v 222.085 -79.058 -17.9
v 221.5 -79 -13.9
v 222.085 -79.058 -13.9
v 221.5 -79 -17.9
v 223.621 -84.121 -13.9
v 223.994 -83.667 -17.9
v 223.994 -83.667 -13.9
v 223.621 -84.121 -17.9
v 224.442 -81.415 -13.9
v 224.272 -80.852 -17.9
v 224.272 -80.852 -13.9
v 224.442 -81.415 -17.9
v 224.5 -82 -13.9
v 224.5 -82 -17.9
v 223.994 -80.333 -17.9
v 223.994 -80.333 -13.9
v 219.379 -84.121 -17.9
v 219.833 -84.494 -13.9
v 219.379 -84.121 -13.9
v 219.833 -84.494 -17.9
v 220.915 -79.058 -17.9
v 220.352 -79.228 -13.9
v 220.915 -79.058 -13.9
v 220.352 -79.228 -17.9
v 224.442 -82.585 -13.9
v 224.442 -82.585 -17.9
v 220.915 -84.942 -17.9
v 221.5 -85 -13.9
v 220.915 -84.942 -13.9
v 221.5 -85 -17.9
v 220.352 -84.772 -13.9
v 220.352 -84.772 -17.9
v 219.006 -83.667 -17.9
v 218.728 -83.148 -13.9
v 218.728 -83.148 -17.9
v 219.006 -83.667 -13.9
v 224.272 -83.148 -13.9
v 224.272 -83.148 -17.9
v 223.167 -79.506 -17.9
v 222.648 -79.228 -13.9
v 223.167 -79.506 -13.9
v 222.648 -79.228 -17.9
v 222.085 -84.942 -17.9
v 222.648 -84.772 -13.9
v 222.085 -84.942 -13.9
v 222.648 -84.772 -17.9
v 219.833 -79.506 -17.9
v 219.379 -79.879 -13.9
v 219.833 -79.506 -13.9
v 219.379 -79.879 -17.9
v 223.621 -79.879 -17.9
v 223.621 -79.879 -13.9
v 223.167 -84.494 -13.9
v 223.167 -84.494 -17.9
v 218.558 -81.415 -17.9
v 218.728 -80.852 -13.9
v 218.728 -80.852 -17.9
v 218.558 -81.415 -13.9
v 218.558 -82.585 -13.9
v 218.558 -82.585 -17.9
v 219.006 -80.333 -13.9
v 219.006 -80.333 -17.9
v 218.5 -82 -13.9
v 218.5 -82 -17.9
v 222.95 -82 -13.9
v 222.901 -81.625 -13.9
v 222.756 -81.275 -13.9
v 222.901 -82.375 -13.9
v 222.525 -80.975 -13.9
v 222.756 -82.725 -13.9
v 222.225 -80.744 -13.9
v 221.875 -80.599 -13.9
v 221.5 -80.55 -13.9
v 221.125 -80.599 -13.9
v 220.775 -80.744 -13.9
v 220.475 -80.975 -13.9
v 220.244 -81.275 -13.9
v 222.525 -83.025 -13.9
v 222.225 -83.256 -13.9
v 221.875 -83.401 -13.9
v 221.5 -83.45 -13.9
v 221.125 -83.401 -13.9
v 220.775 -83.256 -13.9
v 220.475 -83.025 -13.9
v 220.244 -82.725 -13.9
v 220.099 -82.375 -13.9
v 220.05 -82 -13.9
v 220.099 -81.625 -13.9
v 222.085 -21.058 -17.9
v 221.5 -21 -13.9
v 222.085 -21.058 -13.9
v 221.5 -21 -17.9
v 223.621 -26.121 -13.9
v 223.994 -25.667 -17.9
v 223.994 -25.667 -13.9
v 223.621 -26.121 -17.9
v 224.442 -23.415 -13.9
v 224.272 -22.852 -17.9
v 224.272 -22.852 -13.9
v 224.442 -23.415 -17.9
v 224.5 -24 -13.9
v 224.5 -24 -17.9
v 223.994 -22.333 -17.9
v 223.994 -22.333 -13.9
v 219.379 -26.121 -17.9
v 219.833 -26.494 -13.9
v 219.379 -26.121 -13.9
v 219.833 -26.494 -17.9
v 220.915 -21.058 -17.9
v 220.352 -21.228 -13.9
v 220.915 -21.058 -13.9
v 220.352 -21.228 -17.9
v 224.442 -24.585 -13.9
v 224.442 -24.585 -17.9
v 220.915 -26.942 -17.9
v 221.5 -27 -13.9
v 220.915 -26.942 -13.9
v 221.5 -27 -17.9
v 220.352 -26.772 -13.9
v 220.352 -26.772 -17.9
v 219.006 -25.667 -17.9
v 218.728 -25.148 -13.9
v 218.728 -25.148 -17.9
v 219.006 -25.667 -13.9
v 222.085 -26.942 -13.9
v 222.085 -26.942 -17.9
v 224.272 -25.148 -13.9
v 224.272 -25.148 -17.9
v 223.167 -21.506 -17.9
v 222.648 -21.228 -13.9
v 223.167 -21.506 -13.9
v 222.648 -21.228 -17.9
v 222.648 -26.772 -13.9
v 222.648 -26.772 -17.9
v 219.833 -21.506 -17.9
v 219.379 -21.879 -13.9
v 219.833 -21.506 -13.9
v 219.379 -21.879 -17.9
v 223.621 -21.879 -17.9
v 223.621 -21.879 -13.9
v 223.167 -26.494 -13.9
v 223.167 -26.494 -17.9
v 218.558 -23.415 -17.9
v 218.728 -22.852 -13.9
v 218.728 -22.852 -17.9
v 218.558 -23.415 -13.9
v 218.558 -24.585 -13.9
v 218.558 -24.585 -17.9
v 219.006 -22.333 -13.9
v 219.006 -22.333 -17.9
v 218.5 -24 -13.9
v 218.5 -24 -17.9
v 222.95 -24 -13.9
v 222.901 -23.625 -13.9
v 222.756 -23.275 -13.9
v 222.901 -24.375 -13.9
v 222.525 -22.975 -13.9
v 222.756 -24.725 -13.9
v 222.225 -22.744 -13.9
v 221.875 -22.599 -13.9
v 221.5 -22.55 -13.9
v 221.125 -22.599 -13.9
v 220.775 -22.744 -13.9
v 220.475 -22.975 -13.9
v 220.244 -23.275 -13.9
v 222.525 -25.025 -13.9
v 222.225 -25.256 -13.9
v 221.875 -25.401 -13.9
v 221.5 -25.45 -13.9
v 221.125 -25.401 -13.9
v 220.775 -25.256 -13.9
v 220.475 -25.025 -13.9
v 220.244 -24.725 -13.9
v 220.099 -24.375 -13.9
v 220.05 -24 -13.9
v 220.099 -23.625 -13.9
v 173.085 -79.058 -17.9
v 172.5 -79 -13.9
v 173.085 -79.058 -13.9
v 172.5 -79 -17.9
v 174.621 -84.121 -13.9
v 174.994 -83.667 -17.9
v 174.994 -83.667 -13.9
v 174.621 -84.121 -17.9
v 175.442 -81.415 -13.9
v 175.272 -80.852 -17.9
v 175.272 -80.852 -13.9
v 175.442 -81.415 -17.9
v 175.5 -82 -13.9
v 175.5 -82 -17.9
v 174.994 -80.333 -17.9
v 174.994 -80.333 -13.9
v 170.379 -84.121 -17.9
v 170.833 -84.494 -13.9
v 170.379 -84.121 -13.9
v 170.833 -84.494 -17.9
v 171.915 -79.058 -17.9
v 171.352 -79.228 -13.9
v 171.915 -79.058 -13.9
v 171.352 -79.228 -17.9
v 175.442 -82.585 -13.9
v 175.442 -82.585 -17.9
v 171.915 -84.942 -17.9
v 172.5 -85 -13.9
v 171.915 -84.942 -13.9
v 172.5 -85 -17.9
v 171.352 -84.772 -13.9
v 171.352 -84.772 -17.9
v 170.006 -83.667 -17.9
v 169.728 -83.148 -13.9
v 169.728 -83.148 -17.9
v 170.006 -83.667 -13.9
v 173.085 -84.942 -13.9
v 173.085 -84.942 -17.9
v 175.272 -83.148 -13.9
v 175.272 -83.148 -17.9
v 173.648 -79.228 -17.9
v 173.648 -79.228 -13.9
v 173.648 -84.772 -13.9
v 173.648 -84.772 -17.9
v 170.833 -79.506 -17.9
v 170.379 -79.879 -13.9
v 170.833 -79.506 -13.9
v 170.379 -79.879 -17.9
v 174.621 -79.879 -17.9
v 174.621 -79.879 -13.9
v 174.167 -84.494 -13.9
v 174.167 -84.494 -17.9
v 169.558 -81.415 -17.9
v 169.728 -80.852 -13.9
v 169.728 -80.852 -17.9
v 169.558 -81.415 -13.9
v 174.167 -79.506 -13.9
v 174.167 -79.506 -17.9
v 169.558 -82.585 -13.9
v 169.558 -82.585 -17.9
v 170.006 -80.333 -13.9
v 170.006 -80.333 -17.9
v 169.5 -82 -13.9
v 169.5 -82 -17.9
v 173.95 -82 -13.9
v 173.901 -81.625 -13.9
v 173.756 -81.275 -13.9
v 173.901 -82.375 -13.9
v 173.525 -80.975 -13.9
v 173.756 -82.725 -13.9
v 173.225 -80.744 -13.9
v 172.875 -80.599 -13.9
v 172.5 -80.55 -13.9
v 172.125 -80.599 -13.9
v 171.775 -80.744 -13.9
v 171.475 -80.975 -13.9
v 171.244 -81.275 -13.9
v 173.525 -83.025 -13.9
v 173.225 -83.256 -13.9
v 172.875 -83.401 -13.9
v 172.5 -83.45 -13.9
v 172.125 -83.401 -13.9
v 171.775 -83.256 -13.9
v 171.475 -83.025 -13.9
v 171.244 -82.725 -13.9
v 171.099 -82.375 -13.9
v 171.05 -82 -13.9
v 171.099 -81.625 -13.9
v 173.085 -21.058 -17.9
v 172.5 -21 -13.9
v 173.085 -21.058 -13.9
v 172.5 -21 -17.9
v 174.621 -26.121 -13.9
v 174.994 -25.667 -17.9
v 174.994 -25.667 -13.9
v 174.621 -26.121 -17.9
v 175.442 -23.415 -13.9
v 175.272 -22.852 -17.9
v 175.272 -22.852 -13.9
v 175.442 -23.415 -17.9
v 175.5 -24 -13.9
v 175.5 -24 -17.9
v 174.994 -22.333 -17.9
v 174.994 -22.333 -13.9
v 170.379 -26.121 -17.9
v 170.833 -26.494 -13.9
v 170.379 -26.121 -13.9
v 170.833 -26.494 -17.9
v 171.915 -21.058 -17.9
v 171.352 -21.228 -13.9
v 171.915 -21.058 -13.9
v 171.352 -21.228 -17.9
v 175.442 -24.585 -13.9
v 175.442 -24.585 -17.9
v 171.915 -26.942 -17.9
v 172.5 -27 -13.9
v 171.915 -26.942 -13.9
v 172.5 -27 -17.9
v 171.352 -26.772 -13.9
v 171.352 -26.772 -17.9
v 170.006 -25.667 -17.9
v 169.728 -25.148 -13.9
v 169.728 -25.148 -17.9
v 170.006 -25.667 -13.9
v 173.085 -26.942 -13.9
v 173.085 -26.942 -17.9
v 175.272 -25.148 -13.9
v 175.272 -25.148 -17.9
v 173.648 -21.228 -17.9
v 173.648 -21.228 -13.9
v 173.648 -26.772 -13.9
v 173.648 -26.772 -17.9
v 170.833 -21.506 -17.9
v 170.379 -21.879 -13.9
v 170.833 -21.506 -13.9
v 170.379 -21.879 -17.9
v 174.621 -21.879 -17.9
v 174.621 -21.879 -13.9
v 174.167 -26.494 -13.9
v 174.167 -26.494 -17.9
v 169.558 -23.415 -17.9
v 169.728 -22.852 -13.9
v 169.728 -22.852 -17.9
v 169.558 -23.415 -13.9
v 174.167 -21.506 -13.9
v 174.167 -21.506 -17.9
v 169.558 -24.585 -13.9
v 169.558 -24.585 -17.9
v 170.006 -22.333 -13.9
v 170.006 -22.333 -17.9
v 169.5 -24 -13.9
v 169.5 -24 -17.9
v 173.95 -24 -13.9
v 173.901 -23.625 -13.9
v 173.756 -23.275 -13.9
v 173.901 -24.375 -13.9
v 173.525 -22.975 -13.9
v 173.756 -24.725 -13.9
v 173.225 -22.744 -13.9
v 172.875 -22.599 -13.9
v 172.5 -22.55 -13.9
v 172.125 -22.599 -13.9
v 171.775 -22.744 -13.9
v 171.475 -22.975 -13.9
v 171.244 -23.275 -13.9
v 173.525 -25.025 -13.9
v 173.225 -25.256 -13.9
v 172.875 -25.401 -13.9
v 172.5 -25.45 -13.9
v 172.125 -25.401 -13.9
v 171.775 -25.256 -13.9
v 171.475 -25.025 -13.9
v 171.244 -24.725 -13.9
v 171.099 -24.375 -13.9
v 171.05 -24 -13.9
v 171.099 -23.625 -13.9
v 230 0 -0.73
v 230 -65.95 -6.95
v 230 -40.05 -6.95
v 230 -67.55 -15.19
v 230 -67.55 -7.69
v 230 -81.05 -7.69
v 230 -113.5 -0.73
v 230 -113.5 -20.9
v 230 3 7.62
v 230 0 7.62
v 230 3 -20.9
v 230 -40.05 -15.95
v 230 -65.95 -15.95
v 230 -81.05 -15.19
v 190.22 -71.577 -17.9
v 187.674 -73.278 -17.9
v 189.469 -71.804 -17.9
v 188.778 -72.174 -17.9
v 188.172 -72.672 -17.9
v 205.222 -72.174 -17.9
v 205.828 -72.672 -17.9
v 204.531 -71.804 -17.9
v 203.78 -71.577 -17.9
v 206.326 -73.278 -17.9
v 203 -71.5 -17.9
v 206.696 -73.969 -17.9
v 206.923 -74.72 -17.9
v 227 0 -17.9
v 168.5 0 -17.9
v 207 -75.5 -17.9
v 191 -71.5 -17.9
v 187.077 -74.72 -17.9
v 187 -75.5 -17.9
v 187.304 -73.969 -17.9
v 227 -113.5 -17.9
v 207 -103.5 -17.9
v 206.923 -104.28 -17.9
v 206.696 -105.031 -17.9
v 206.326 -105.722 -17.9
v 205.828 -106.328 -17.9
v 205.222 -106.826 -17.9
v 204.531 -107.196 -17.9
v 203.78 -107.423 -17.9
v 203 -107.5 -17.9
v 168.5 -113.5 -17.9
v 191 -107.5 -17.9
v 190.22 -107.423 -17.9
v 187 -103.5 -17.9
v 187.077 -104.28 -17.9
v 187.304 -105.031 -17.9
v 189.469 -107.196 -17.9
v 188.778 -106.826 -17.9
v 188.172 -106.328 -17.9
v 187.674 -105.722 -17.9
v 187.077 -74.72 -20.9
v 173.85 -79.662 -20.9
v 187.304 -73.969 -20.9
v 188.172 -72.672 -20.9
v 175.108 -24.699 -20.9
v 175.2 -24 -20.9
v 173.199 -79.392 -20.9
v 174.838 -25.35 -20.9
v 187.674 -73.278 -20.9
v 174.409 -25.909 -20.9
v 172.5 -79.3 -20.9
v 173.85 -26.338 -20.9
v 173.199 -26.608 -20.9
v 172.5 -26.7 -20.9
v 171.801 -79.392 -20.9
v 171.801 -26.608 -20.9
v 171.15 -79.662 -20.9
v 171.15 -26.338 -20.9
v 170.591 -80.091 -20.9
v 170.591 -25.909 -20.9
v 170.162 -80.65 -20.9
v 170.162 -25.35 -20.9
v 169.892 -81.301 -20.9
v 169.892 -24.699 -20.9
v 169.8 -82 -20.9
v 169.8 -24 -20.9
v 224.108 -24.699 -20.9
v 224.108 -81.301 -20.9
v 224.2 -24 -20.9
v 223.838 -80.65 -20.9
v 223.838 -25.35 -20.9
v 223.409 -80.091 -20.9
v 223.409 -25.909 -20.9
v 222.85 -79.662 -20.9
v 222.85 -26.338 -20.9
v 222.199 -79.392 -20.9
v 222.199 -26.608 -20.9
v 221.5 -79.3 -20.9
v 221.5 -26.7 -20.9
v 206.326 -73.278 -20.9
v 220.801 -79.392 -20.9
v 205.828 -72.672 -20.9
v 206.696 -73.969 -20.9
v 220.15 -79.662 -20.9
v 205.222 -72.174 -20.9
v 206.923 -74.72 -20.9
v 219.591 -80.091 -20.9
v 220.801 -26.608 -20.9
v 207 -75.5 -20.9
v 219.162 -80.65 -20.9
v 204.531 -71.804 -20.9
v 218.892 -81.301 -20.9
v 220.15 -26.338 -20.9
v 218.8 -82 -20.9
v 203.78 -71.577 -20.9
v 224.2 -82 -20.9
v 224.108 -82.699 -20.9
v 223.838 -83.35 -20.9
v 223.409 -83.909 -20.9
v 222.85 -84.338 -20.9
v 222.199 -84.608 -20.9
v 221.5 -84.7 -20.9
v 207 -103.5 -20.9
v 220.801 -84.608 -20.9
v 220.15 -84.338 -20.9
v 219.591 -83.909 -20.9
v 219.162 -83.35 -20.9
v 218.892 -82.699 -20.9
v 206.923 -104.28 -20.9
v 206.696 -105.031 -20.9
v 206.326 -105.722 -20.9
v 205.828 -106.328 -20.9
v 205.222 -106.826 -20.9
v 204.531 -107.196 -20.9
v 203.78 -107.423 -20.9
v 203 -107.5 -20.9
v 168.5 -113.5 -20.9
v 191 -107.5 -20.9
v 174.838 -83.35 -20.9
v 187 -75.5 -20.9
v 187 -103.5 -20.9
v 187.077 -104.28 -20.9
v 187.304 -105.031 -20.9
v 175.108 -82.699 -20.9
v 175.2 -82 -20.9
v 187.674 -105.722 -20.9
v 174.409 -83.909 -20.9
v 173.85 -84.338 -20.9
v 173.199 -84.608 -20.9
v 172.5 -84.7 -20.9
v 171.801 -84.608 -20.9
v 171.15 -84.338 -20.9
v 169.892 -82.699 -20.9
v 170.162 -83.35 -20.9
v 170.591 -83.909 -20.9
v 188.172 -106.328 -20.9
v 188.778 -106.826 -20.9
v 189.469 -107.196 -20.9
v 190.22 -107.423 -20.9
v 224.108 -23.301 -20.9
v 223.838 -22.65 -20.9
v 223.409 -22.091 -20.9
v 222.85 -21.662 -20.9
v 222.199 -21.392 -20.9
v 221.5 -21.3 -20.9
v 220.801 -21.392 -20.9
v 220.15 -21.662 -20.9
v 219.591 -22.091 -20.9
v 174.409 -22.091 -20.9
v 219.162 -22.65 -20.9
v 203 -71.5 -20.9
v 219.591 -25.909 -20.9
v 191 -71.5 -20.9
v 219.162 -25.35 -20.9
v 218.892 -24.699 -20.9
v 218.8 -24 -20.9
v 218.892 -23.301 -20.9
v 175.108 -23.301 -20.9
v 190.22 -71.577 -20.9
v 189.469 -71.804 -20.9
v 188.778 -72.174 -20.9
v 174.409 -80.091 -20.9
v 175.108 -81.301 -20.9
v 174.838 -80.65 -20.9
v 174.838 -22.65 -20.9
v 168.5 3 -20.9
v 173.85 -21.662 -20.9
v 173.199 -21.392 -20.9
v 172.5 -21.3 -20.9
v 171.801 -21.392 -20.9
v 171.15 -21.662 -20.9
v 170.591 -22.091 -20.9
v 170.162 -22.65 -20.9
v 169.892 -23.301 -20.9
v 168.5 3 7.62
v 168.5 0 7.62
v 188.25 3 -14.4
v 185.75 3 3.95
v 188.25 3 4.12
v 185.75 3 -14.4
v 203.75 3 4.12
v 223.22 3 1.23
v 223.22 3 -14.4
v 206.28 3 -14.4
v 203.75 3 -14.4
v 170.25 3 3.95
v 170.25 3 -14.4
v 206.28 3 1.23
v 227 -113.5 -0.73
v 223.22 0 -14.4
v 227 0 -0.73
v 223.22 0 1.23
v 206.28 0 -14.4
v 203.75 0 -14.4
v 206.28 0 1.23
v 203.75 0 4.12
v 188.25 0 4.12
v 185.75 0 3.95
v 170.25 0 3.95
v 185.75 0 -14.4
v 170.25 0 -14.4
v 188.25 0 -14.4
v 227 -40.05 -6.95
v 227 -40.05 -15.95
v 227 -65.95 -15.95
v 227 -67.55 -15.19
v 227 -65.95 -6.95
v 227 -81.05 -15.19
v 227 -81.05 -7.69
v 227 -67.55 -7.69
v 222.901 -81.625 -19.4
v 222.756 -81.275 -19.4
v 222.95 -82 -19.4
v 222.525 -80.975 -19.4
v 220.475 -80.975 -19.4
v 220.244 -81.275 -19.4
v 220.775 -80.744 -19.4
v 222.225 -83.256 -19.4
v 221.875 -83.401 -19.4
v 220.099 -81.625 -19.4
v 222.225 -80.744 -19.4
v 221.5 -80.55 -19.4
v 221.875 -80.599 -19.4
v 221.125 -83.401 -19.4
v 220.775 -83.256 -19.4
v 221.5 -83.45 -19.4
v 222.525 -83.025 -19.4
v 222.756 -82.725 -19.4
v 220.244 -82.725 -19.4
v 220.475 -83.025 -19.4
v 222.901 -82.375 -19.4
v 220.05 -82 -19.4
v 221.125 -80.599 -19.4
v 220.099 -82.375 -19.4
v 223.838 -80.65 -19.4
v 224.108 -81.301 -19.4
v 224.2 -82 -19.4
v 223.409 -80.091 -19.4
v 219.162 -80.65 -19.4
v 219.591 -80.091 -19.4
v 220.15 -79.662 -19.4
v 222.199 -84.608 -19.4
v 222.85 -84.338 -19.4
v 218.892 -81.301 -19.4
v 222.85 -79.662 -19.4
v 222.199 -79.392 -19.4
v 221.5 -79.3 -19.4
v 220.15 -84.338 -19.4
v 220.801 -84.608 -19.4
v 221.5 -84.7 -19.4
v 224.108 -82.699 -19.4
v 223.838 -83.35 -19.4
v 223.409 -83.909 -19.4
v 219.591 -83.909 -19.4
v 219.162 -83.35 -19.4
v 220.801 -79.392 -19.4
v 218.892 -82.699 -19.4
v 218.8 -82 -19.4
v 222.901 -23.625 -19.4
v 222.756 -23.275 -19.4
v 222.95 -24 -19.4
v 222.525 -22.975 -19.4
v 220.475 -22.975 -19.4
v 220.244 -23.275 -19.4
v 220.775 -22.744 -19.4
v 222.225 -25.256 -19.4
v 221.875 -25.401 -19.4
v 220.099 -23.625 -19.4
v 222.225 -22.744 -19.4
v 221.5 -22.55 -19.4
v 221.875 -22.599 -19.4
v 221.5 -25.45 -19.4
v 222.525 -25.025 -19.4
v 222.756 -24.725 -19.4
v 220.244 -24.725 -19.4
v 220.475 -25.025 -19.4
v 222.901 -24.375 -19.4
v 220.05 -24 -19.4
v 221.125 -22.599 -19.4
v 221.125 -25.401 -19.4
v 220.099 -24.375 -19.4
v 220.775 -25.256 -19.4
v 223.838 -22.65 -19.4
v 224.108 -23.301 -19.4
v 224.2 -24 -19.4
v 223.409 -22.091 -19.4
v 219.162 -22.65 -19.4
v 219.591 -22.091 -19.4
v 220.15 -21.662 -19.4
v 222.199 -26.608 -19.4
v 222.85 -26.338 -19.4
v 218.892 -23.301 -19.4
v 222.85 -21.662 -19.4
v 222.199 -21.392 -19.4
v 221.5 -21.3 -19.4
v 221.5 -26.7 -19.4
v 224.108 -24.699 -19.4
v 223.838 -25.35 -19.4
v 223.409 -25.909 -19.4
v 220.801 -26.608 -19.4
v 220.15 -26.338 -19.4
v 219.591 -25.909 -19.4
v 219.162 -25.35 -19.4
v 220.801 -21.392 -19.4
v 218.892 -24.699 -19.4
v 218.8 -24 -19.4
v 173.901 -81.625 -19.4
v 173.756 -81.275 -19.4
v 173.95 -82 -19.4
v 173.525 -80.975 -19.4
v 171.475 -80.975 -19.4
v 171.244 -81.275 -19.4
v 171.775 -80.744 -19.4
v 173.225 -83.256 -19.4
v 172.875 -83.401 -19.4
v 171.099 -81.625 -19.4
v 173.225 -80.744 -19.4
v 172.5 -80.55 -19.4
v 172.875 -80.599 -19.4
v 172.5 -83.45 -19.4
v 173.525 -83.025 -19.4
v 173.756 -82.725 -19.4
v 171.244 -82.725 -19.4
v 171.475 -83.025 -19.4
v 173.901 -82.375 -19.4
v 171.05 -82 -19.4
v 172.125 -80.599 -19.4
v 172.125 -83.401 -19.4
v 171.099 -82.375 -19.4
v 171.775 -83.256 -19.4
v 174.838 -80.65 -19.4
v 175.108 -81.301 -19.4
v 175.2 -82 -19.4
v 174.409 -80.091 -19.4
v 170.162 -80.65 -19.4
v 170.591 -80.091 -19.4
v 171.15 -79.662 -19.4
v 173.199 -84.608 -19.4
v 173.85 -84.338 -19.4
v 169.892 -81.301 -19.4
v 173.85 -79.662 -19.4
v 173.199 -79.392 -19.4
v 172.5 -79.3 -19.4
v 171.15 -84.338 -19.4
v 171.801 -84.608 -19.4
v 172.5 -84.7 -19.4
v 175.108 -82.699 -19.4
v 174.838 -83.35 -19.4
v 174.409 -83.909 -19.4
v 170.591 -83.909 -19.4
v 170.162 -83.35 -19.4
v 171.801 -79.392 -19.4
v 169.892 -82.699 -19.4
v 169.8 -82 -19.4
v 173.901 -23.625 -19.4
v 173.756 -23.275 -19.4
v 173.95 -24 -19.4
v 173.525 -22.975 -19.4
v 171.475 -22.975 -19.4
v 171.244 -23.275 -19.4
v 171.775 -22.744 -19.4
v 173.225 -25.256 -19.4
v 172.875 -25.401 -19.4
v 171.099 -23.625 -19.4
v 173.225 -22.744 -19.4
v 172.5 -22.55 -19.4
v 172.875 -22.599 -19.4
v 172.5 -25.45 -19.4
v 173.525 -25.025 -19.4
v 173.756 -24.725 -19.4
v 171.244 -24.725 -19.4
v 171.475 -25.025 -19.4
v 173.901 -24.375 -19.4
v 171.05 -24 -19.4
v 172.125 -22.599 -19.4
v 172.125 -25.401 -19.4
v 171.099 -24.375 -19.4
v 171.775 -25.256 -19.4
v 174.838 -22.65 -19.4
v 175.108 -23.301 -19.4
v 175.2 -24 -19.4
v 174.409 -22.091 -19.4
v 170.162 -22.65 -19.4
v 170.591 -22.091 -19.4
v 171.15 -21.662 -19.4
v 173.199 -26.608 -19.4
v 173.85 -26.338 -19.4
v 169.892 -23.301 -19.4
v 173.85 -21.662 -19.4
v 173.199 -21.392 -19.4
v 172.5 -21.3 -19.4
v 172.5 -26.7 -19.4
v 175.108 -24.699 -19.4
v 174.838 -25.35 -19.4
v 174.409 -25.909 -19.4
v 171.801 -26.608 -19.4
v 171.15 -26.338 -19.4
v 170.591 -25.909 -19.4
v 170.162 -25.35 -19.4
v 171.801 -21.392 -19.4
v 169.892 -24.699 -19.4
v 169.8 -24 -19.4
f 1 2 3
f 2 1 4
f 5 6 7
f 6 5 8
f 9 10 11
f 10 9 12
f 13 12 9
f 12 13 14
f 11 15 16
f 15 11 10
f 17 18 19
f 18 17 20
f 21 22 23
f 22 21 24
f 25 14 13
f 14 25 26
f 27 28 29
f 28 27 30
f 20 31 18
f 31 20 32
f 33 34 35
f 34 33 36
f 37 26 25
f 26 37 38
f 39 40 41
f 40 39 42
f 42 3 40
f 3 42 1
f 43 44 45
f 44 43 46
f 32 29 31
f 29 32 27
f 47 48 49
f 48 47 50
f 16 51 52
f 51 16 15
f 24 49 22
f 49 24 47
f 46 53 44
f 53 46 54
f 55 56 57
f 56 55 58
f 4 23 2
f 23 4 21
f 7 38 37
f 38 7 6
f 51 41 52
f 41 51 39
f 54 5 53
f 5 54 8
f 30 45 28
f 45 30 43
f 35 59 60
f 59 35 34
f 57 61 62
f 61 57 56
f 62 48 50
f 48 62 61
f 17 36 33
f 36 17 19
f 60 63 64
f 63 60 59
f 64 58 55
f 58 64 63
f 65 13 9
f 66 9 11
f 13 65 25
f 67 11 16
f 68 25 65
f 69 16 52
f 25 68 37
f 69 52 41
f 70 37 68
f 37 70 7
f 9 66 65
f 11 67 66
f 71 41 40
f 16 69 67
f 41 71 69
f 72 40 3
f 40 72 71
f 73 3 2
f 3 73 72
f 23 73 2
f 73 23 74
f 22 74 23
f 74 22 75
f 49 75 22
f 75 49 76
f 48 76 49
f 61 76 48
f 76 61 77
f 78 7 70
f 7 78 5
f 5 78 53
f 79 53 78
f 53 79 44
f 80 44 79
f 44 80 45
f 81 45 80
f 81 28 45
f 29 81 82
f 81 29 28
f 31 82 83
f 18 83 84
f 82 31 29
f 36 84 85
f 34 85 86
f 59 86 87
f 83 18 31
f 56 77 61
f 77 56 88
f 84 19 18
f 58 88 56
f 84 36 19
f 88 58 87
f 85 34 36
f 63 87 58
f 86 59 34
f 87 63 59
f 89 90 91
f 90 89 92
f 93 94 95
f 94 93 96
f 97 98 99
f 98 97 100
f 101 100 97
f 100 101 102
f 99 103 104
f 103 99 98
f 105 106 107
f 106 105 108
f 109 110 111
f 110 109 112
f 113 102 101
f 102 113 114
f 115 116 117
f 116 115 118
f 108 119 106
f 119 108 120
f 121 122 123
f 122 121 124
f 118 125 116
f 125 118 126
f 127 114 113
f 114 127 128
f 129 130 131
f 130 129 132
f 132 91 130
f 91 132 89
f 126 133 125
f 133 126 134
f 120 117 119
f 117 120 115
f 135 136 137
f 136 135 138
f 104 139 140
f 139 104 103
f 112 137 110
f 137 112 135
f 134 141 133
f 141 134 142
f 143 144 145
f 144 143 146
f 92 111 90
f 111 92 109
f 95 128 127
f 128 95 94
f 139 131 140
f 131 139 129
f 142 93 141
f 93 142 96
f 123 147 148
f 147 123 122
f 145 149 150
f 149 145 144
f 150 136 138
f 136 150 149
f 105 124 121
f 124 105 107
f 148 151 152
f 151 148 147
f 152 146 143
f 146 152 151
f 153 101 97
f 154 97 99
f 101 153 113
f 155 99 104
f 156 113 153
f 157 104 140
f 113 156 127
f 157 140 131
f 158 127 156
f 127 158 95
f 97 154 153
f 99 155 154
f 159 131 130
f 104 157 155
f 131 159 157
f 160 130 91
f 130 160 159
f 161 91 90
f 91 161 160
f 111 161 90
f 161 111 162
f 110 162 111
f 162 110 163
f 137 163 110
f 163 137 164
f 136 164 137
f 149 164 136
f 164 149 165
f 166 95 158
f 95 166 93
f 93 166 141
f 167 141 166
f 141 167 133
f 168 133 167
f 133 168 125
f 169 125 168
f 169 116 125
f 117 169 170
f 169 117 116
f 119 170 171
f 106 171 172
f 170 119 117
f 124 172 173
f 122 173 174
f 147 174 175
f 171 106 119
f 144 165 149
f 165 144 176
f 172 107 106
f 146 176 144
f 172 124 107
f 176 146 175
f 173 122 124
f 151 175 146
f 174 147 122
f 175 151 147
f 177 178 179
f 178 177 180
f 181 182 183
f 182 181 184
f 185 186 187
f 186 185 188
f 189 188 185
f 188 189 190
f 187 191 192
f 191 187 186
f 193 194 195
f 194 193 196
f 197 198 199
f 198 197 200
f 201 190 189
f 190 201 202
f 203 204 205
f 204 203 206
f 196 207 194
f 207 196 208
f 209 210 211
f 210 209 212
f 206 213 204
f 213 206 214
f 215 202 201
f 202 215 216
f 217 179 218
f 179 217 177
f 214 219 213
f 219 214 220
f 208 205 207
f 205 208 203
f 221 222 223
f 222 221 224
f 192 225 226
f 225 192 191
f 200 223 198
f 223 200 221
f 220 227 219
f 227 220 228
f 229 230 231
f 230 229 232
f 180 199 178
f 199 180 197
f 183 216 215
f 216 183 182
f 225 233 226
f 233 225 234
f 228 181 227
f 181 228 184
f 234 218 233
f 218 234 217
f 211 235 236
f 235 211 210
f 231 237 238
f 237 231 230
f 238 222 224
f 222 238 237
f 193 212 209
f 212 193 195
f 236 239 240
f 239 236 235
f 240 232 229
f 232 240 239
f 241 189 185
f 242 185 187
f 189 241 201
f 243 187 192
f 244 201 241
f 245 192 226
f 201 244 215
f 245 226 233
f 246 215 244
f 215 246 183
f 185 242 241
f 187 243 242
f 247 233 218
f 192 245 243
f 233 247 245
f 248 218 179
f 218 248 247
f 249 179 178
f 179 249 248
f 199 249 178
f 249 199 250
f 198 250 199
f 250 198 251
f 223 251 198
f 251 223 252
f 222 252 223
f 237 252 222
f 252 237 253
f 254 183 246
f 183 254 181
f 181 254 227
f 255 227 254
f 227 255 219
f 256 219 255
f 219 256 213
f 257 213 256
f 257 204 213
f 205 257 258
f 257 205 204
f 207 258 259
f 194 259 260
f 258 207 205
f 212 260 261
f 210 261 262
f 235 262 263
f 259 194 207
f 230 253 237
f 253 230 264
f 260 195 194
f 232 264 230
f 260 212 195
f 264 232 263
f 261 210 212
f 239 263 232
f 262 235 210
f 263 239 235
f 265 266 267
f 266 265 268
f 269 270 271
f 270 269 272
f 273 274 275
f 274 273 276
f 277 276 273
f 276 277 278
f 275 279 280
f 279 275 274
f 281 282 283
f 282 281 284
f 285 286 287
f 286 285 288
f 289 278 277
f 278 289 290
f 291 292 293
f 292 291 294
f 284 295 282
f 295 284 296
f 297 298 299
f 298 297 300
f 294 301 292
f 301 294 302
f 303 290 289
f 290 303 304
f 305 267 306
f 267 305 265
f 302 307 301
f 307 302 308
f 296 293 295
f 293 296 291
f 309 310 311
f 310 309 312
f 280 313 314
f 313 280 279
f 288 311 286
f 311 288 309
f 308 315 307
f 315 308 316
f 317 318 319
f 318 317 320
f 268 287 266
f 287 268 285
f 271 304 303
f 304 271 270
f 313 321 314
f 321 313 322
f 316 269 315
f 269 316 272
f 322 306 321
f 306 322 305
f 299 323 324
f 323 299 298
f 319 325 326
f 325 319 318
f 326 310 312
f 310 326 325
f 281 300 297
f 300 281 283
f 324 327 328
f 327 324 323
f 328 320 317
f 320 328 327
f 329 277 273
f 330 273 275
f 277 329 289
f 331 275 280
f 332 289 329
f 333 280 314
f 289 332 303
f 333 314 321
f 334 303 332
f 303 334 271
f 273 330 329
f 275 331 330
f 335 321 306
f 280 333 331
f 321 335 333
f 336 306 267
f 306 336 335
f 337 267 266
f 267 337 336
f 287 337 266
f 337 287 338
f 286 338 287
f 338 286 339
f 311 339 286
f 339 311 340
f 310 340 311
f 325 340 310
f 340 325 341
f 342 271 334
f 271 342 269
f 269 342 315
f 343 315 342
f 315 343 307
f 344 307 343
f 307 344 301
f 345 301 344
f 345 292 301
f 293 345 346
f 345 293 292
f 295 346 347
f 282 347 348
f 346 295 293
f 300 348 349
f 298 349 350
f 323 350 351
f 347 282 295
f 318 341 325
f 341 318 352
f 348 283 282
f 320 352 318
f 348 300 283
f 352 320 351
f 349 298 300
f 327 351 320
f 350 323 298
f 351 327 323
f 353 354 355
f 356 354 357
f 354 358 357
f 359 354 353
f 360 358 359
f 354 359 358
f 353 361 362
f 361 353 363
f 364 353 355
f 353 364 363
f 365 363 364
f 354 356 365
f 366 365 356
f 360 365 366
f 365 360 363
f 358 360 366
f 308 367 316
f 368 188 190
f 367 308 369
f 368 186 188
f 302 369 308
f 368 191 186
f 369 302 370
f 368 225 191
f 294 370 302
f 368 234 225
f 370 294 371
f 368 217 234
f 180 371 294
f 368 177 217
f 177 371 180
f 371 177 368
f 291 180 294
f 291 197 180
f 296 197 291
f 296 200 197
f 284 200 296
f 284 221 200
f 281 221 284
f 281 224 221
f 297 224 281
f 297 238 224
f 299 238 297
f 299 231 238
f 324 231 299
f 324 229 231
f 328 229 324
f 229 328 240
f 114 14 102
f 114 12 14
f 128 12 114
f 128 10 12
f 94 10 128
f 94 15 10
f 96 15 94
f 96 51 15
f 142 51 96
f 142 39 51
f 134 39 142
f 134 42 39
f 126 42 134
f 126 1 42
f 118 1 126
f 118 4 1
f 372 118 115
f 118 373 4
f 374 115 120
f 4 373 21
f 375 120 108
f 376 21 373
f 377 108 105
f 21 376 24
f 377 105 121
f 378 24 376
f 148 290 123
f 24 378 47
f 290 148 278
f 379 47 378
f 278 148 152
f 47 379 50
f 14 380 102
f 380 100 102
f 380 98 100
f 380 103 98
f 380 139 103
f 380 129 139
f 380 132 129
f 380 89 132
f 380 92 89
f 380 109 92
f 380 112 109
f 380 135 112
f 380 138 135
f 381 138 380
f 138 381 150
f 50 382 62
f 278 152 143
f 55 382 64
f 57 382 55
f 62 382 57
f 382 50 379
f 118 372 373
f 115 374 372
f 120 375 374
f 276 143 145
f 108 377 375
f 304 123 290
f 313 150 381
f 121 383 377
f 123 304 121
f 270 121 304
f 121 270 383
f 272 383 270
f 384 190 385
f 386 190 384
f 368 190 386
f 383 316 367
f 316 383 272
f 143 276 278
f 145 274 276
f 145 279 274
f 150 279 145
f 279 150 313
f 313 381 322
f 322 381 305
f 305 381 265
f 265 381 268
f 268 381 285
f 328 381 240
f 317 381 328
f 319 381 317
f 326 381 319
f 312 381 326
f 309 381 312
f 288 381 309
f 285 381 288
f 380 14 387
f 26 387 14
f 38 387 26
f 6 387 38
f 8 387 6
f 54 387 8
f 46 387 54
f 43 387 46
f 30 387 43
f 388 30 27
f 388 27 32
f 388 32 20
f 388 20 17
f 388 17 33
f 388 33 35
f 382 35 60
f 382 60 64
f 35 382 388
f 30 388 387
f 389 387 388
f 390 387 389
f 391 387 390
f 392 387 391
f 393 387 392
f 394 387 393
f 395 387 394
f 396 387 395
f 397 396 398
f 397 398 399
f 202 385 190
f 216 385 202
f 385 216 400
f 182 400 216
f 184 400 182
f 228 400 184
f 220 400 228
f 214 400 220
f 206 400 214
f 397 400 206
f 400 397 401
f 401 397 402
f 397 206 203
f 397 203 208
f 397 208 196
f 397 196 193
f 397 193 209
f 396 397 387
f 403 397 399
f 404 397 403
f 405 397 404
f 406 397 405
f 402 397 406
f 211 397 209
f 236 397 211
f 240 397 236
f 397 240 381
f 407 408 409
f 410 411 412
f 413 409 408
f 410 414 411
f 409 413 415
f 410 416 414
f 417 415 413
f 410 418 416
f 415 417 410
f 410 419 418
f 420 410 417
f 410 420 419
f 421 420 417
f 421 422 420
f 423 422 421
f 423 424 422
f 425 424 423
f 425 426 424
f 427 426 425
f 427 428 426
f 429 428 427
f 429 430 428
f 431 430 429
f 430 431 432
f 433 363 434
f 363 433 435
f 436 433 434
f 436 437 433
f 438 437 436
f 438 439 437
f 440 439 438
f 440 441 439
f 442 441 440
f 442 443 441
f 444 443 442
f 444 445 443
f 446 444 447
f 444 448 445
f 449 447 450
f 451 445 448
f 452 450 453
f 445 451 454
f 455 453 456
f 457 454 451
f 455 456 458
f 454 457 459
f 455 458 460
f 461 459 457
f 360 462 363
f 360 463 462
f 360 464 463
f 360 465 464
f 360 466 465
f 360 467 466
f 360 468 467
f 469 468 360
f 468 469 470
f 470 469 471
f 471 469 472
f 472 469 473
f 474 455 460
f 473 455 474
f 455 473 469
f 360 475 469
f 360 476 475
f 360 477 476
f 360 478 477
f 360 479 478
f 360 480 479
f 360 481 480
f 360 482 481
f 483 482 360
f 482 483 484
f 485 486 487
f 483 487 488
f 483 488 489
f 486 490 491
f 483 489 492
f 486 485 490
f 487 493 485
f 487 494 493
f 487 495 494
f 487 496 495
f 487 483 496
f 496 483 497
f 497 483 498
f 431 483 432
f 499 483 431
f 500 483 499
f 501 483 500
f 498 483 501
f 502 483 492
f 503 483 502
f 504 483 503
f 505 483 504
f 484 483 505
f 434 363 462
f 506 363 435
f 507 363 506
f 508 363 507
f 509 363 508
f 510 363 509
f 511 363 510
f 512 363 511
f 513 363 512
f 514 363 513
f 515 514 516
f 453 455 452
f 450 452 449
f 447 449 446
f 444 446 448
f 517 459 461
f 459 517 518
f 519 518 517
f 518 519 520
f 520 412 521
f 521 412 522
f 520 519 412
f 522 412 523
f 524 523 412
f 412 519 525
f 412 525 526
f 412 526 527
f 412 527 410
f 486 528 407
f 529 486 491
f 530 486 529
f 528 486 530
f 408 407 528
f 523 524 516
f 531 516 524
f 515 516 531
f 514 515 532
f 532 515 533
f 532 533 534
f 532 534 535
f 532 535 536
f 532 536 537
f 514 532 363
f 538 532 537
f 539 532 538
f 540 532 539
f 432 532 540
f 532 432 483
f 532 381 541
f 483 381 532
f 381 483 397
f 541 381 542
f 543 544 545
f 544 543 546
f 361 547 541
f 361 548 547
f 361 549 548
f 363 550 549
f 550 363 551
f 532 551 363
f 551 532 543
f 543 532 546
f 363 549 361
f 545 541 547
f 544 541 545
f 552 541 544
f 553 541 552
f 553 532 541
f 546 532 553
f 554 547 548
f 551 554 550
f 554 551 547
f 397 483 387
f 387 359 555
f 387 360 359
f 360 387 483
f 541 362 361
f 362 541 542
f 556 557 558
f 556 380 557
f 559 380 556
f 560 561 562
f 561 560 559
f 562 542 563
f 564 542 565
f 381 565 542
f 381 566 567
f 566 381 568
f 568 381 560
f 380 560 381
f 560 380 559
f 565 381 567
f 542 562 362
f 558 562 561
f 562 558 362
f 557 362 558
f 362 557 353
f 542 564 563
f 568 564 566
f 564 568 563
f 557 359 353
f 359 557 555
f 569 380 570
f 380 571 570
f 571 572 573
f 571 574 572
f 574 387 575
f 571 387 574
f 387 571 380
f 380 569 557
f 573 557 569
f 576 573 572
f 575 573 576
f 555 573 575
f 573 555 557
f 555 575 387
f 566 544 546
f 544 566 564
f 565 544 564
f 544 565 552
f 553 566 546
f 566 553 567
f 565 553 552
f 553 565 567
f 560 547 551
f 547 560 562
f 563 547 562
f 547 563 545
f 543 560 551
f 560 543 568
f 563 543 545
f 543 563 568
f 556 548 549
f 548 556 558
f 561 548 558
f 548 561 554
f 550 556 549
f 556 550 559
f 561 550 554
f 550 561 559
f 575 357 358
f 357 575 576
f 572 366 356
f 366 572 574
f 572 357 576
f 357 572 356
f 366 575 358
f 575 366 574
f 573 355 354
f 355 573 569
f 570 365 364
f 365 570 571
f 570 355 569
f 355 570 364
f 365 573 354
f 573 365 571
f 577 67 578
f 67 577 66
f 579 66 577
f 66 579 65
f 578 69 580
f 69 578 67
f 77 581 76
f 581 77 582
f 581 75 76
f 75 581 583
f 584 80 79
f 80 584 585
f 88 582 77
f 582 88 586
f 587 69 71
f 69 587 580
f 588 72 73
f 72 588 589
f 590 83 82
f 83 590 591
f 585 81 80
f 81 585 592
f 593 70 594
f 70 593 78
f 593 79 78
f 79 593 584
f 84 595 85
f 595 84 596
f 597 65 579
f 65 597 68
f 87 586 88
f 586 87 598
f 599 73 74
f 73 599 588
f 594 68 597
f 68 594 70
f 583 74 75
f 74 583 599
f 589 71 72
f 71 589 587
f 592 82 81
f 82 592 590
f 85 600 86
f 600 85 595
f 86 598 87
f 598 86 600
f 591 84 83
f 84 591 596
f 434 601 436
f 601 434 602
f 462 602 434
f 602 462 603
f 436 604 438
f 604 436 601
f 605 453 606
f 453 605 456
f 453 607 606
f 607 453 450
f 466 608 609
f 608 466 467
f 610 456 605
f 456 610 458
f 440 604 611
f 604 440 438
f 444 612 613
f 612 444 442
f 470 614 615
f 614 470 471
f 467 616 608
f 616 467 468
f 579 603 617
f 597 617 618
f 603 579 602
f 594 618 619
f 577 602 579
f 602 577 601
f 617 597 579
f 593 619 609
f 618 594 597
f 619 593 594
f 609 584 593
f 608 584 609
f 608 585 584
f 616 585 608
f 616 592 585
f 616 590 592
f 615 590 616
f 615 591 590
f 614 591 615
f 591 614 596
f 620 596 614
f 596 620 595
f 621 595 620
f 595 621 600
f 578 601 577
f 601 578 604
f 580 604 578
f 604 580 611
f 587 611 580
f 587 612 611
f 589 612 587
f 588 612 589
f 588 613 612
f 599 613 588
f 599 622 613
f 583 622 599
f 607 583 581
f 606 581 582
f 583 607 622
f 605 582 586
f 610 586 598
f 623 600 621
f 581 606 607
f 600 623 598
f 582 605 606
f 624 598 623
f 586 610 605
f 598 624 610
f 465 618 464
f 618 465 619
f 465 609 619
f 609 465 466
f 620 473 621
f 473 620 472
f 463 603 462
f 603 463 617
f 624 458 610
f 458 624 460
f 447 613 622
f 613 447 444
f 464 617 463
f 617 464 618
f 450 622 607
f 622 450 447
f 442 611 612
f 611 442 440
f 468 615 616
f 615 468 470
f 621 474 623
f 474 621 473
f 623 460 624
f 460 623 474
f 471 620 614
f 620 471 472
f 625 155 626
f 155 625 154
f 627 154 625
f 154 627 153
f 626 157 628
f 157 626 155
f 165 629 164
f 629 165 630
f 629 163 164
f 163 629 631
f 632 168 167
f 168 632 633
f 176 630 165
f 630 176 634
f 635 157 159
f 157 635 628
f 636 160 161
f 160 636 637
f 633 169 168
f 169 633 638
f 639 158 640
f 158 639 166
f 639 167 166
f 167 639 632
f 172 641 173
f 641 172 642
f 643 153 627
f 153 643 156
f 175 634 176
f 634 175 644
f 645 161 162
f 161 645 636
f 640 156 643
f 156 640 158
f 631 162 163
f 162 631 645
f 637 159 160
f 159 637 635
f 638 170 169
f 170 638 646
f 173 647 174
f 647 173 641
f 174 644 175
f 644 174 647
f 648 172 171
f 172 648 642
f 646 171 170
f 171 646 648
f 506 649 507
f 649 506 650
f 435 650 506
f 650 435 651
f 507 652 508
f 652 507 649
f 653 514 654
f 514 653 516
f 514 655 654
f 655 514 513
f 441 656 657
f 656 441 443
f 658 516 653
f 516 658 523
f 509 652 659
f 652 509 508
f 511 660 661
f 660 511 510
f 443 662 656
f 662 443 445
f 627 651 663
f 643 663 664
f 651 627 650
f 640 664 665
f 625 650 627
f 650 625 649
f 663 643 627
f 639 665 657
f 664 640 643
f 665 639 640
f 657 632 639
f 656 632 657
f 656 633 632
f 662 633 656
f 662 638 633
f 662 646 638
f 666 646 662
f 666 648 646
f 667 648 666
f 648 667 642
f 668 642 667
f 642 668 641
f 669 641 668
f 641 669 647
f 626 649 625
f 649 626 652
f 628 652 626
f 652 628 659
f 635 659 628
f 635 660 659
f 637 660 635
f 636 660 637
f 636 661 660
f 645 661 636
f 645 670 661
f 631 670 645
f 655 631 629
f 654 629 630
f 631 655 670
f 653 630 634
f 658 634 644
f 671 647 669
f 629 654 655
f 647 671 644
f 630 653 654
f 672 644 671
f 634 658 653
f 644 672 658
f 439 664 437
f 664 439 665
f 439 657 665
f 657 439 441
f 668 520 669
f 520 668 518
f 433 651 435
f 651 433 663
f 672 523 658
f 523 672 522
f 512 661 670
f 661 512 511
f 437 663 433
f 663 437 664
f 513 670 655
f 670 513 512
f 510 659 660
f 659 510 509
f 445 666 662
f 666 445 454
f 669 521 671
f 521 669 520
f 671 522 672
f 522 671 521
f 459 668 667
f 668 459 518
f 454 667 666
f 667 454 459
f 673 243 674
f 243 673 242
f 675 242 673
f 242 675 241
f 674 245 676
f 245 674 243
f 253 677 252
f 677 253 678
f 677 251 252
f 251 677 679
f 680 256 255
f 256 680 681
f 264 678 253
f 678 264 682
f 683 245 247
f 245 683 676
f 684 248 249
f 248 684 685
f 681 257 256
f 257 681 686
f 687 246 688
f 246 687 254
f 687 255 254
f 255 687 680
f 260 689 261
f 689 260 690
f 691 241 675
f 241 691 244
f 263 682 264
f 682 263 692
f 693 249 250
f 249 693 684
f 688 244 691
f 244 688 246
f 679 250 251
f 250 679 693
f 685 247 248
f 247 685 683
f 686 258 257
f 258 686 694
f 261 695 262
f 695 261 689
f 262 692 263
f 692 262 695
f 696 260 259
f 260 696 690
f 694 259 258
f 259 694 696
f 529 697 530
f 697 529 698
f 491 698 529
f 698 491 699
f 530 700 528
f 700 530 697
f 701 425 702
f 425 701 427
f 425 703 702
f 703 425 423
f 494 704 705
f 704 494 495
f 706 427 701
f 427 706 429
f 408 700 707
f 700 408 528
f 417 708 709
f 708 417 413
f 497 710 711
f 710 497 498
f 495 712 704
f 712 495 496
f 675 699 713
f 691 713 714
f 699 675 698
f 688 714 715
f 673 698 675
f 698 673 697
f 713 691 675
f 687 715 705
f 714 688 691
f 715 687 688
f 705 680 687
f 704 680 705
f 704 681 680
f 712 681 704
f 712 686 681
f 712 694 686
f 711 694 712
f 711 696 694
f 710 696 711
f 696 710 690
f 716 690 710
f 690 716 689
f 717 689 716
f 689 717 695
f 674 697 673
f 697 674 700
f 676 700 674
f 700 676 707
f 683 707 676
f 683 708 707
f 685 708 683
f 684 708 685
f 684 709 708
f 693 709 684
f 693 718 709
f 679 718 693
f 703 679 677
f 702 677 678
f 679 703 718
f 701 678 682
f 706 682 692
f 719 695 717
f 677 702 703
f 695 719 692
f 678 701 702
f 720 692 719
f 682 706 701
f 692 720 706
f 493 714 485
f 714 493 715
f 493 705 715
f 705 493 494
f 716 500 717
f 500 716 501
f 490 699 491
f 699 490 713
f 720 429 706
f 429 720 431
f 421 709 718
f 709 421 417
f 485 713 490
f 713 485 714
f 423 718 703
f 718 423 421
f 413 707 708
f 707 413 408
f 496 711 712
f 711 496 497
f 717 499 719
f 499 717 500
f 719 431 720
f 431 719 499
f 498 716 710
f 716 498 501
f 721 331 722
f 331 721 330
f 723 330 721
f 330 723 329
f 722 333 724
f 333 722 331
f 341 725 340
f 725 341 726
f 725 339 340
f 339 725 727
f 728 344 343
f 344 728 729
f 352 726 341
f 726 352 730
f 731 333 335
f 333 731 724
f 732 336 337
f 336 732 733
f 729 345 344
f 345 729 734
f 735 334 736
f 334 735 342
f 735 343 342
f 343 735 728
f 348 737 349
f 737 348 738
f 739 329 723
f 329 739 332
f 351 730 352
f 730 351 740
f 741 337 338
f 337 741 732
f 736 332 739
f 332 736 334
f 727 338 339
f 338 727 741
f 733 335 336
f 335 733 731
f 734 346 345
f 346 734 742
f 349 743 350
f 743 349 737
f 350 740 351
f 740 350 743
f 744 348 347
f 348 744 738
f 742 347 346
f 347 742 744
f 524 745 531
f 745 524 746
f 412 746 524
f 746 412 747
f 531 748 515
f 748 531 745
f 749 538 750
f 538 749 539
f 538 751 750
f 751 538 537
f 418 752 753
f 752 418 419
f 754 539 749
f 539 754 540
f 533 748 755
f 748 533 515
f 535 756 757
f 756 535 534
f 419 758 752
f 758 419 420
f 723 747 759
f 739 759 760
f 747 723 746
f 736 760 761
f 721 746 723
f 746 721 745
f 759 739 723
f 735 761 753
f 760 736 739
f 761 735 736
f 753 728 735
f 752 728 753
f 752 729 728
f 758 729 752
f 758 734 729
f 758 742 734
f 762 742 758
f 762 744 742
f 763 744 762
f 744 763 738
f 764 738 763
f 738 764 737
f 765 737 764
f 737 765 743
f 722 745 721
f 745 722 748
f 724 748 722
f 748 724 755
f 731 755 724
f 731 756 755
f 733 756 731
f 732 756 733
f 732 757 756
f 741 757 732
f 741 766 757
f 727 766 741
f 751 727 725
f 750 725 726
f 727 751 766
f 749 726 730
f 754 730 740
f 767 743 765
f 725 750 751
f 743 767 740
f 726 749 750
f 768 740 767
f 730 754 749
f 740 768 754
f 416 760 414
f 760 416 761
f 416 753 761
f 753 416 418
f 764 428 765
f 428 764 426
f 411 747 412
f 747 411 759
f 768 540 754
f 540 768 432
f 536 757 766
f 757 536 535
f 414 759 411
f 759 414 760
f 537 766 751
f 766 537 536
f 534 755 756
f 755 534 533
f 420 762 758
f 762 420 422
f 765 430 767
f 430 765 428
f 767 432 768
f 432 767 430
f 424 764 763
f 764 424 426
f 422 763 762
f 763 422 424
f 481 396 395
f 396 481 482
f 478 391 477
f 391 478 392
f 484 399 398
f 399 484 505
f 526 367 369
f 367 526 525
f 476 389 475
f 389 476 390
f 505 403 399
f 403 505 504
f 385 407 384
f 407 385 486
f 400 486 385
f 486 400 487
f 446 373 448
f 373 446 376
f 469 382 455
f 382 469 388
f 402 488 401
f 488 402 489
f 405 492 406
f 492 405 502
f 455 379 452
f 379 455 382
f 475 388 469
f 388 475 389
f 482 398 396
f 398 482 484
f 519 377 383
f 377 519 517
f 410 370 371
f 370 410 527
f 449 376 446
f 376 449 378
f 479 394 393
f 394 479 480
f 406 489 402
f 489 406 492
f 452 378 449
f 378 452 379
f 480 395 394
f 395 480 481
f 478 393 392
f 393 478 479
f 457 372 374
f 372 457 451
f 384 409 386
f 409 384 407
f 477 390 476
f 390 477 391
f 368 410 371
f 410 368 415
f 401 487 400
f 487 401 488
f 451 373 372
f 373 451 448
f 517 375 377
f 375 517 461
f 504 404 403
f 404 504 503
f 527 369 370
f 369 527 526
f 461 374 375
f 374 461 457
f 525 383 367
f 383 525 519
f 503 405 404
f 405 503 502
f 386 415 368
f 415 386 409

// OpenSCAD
// file: dims.scad
// Sizes of the Pivuan audio box, and the cut-outs and bosses its case parts share.
// Written by pcb/gen/panel.py from the board layout and the Pi 5's measured model; don't
// edit by hand. Frame: x along the rear panel as on the board, y = 0 the rear panel's inner
// face (outside toward +y), z = 0 the board's top surface.
wall = 3.0;  // rear panel and walls
floor_t = 3.0;
pcb = 1.6;
board_w = 176.0;  board_d = 86.0;
notch_x = 168.0;  notch_y = 21.0;  // the board's cut-out over the Pi's USB sockets
z_pi = -12.6;  // the Pi board's top: 11.0 mm under our board
pi_pcb = 1.3;
z_floor = -17.9;  // the floor's inner surface: the Pi stands 4.0 mm over it
pi_x0 = 225.0;  // x of the Pi's edge with the USB-C and HDMI sockets
pi_y0 = -85.5;  // y of the Pi's SD-card edge
x_right = 227.0;  // the inner face of the side wall beside the Pi
board_holes = [[3.5, -82.5], [3.5, -46.0], [88, -69], [128, -82.5]];  // M3, to case bosses
pi_holes = [[221.50, -82.00], [221.50, -24.00], [172.50, -82.00], [172.50, -24.00]];  // M2.5

// Puts a model drawn in the Pi's own frame (parts.scad) where the Pi sits.
module pi_place() {
    multmatrix([[0, -1, 0, 225.0], [1, 0, 0, -85.5], [0, 0, 1, -12.6], [0, 0, 0, 1]]) children();
}

// Everything cut out of the rear panel (which fills 0 < y < wall).
module rear_cuts() {
    // J5: NMJ6HCD2
    translate([14, -1, 8.14]) rotate([-90, 0, 0]) cylinder(d = 11.4, h = wall + 2, $fn = 64);
    // RV1: RK09L
    translate([35, -1, 6.5]) rotate([-90, 0, 0]) cylinder(d = 9.5, h = wall + 2, $fn = 64);
    translate([33.8, -1, -0.3]) cube([2.4, 2.2, 1.6]);
    // D5: LED3
    translate([47, -1, 6.0]) rotate([-90, 0, 0]) cylinder(d = 3.2, h = wall + 2, $fn = 64);
    // RV2: RK09L
    translate([60, -1, 6.5]) rotate([-90, 0, 0]) cylinder(d = 9.5, h = wall + 2, $fn = 64);
    translate([58.8, -1, -0.3]) cube([2.4, 2.2, 1.6]);
    // J6: NMJ6HCD2
    translate([80, -1, 8.14]) rotate([-90, 0, 0]) cylinder(d = 11.4, h = wall + 2, $fn = 64);
    // J7: NMJ6HCD2
    translate([102, -1, 8.14]) rotate([-90, 0, 0]) cylinder(d = 11.4, h = wall + 2, $fn = 64);
    // RV3: RK09L
    translate([122, -1, 6.5]) rotate([-90, 0, 0]) cylinder(d = 9.5, h = wall + 2, $fn = 64);
    translate([120.8, -1, -0.3]) cube([2.4, 2.2, 1.6]);
    // J8: NMJ6HCD2
    translate([142, -1, 8.14]) rotate([-90, 0, 0]) cylinder(d = 11.4, h = wall + 2, $fn = 64);
    // SW1: PTS645
    translate([161, -1, 3.5]) rotate([-90, 0, 0]) cylinder(d = 4.0, h = wall + 2, $fn = 64);
    // the Pi's USB 2 pair: 2.28 mm into the panel
    translate([170.25, -1.00, -14.40]) cube([15.50, 5.00, 18.35]);
    // the Pi's USB 3 pair: 2.50 mm into the panel
    translate([188.25, -1.00, -14.40]) cube([15.50, 5.00, 18.52]);
    // the Pi's Ethernet: 2.55 mm into the panel
    translate([206.28, -1.00, -14.40]) cube([16.94, 5.00, 15.63]);
}

// Everything cut out of the side wall beside the Pi (which fills x_right < x < x_right + wall).
module side_cuts() {
    // USB-C power: the socket's face is 0.80 mm inside the wall's inner face
    translate([226.00, -81.05, -15.19]) cube([5.00, 13.50, 7.50]);
    // both micro-HDMI sockets: faces 0.37 mm inside the wall's inner face
    translate([226.00, -65.95, -15.95]) cube([5.00, 25.90, 9.00]);
}

// Everything cut out of the floor (which fills z_floor - floor_t < z < z_floor).
module floor_cuts() {
    // the SD card's finger opening: the card comes out toward the front, label side down
    hull() for (x = [191.00, 203.00]) for (y = [-103.50, -75.50])
        translate([x, y, z_floor - floor_t - 1]) cylinder(r = 4, h = floor_t + 2, $fn = 32);
    // M2.5 screws from below into the Pi's stand-offs and nuts, heads sunk 1.5 mm
    for (p = pi_holes) translate([p[0], p[1], z_floor - floor_t - 1]) {
        cylinder(d = 2.9, h = floor_t + 20, $fn = 24);
        cylinder(d = 5.4, h = 2.5, $fn = 24);
    }
}

// What the Pi stands on: four bosses under its mounting holes.
module pi_bosses() {
    // (solid: floor_cuts() drills the screw holes through floor and boss together)
    for (p = pi_holes) translate([p[0], p[1], z_floor - 0.5]) cylinder(d = 6, h = 4.0 + 0.5, $fn = 32);
}

// What the board stands on away from the Pi: four bosses under its M3 holes, each with a
// 2.5 mm pilot hole for a self-tapping M3 screw (or drilled out for a heat-set insert).
module board_bosses() {
    for (p = board_holes) translate([p[0], p[1], z_floor - 0.5]) difference() {
        cylinder(d1 = 10, d2 = 7, h = -pcb - z_floor + 0.5, $fn = 32);
        translate([0, 0, -pcb - z_floor - 8.5]) cylinder(d = 2.5, h = 10, $fn = 24);
    }
}
// main file
// Test print of the case corner the Pi 5 sits in: the floor with its four bosses and the
// SD card's finger opening, the rear wall with the USB and Ethernet openings, the side wall
// with the USB-C and micro-HDMI openings. Written by pcb/gen/panel.py; don't edit by hand.
// Print it floor down. Screw the Pi on (M2.5 from below) and try: every plug you use, with
// the plug pushed fully home; the SD card out and in through the floor with a fingertip.
// The Pi goes in tilted, sockets first into the rear wall, then down onto the bosses.
include <dims.scad>

module pi_corner_test() {
    difference() {
        union() {
            translate([168.50, -113.50, -20.90]) cube([61.50, 116.50, 3.00]);
            translate([168.50, 0.00, -20.90]) cube([61.50, 3.00, 28.52]);
            translate([227.00, -113.50, -20.90]) cube([3.00, 116.50, 20.17]);
            pi_bosses();
        }
        rear_cuts();
        side_cuts();
        floor_cuts();
    }
}

pi_corner_test();
